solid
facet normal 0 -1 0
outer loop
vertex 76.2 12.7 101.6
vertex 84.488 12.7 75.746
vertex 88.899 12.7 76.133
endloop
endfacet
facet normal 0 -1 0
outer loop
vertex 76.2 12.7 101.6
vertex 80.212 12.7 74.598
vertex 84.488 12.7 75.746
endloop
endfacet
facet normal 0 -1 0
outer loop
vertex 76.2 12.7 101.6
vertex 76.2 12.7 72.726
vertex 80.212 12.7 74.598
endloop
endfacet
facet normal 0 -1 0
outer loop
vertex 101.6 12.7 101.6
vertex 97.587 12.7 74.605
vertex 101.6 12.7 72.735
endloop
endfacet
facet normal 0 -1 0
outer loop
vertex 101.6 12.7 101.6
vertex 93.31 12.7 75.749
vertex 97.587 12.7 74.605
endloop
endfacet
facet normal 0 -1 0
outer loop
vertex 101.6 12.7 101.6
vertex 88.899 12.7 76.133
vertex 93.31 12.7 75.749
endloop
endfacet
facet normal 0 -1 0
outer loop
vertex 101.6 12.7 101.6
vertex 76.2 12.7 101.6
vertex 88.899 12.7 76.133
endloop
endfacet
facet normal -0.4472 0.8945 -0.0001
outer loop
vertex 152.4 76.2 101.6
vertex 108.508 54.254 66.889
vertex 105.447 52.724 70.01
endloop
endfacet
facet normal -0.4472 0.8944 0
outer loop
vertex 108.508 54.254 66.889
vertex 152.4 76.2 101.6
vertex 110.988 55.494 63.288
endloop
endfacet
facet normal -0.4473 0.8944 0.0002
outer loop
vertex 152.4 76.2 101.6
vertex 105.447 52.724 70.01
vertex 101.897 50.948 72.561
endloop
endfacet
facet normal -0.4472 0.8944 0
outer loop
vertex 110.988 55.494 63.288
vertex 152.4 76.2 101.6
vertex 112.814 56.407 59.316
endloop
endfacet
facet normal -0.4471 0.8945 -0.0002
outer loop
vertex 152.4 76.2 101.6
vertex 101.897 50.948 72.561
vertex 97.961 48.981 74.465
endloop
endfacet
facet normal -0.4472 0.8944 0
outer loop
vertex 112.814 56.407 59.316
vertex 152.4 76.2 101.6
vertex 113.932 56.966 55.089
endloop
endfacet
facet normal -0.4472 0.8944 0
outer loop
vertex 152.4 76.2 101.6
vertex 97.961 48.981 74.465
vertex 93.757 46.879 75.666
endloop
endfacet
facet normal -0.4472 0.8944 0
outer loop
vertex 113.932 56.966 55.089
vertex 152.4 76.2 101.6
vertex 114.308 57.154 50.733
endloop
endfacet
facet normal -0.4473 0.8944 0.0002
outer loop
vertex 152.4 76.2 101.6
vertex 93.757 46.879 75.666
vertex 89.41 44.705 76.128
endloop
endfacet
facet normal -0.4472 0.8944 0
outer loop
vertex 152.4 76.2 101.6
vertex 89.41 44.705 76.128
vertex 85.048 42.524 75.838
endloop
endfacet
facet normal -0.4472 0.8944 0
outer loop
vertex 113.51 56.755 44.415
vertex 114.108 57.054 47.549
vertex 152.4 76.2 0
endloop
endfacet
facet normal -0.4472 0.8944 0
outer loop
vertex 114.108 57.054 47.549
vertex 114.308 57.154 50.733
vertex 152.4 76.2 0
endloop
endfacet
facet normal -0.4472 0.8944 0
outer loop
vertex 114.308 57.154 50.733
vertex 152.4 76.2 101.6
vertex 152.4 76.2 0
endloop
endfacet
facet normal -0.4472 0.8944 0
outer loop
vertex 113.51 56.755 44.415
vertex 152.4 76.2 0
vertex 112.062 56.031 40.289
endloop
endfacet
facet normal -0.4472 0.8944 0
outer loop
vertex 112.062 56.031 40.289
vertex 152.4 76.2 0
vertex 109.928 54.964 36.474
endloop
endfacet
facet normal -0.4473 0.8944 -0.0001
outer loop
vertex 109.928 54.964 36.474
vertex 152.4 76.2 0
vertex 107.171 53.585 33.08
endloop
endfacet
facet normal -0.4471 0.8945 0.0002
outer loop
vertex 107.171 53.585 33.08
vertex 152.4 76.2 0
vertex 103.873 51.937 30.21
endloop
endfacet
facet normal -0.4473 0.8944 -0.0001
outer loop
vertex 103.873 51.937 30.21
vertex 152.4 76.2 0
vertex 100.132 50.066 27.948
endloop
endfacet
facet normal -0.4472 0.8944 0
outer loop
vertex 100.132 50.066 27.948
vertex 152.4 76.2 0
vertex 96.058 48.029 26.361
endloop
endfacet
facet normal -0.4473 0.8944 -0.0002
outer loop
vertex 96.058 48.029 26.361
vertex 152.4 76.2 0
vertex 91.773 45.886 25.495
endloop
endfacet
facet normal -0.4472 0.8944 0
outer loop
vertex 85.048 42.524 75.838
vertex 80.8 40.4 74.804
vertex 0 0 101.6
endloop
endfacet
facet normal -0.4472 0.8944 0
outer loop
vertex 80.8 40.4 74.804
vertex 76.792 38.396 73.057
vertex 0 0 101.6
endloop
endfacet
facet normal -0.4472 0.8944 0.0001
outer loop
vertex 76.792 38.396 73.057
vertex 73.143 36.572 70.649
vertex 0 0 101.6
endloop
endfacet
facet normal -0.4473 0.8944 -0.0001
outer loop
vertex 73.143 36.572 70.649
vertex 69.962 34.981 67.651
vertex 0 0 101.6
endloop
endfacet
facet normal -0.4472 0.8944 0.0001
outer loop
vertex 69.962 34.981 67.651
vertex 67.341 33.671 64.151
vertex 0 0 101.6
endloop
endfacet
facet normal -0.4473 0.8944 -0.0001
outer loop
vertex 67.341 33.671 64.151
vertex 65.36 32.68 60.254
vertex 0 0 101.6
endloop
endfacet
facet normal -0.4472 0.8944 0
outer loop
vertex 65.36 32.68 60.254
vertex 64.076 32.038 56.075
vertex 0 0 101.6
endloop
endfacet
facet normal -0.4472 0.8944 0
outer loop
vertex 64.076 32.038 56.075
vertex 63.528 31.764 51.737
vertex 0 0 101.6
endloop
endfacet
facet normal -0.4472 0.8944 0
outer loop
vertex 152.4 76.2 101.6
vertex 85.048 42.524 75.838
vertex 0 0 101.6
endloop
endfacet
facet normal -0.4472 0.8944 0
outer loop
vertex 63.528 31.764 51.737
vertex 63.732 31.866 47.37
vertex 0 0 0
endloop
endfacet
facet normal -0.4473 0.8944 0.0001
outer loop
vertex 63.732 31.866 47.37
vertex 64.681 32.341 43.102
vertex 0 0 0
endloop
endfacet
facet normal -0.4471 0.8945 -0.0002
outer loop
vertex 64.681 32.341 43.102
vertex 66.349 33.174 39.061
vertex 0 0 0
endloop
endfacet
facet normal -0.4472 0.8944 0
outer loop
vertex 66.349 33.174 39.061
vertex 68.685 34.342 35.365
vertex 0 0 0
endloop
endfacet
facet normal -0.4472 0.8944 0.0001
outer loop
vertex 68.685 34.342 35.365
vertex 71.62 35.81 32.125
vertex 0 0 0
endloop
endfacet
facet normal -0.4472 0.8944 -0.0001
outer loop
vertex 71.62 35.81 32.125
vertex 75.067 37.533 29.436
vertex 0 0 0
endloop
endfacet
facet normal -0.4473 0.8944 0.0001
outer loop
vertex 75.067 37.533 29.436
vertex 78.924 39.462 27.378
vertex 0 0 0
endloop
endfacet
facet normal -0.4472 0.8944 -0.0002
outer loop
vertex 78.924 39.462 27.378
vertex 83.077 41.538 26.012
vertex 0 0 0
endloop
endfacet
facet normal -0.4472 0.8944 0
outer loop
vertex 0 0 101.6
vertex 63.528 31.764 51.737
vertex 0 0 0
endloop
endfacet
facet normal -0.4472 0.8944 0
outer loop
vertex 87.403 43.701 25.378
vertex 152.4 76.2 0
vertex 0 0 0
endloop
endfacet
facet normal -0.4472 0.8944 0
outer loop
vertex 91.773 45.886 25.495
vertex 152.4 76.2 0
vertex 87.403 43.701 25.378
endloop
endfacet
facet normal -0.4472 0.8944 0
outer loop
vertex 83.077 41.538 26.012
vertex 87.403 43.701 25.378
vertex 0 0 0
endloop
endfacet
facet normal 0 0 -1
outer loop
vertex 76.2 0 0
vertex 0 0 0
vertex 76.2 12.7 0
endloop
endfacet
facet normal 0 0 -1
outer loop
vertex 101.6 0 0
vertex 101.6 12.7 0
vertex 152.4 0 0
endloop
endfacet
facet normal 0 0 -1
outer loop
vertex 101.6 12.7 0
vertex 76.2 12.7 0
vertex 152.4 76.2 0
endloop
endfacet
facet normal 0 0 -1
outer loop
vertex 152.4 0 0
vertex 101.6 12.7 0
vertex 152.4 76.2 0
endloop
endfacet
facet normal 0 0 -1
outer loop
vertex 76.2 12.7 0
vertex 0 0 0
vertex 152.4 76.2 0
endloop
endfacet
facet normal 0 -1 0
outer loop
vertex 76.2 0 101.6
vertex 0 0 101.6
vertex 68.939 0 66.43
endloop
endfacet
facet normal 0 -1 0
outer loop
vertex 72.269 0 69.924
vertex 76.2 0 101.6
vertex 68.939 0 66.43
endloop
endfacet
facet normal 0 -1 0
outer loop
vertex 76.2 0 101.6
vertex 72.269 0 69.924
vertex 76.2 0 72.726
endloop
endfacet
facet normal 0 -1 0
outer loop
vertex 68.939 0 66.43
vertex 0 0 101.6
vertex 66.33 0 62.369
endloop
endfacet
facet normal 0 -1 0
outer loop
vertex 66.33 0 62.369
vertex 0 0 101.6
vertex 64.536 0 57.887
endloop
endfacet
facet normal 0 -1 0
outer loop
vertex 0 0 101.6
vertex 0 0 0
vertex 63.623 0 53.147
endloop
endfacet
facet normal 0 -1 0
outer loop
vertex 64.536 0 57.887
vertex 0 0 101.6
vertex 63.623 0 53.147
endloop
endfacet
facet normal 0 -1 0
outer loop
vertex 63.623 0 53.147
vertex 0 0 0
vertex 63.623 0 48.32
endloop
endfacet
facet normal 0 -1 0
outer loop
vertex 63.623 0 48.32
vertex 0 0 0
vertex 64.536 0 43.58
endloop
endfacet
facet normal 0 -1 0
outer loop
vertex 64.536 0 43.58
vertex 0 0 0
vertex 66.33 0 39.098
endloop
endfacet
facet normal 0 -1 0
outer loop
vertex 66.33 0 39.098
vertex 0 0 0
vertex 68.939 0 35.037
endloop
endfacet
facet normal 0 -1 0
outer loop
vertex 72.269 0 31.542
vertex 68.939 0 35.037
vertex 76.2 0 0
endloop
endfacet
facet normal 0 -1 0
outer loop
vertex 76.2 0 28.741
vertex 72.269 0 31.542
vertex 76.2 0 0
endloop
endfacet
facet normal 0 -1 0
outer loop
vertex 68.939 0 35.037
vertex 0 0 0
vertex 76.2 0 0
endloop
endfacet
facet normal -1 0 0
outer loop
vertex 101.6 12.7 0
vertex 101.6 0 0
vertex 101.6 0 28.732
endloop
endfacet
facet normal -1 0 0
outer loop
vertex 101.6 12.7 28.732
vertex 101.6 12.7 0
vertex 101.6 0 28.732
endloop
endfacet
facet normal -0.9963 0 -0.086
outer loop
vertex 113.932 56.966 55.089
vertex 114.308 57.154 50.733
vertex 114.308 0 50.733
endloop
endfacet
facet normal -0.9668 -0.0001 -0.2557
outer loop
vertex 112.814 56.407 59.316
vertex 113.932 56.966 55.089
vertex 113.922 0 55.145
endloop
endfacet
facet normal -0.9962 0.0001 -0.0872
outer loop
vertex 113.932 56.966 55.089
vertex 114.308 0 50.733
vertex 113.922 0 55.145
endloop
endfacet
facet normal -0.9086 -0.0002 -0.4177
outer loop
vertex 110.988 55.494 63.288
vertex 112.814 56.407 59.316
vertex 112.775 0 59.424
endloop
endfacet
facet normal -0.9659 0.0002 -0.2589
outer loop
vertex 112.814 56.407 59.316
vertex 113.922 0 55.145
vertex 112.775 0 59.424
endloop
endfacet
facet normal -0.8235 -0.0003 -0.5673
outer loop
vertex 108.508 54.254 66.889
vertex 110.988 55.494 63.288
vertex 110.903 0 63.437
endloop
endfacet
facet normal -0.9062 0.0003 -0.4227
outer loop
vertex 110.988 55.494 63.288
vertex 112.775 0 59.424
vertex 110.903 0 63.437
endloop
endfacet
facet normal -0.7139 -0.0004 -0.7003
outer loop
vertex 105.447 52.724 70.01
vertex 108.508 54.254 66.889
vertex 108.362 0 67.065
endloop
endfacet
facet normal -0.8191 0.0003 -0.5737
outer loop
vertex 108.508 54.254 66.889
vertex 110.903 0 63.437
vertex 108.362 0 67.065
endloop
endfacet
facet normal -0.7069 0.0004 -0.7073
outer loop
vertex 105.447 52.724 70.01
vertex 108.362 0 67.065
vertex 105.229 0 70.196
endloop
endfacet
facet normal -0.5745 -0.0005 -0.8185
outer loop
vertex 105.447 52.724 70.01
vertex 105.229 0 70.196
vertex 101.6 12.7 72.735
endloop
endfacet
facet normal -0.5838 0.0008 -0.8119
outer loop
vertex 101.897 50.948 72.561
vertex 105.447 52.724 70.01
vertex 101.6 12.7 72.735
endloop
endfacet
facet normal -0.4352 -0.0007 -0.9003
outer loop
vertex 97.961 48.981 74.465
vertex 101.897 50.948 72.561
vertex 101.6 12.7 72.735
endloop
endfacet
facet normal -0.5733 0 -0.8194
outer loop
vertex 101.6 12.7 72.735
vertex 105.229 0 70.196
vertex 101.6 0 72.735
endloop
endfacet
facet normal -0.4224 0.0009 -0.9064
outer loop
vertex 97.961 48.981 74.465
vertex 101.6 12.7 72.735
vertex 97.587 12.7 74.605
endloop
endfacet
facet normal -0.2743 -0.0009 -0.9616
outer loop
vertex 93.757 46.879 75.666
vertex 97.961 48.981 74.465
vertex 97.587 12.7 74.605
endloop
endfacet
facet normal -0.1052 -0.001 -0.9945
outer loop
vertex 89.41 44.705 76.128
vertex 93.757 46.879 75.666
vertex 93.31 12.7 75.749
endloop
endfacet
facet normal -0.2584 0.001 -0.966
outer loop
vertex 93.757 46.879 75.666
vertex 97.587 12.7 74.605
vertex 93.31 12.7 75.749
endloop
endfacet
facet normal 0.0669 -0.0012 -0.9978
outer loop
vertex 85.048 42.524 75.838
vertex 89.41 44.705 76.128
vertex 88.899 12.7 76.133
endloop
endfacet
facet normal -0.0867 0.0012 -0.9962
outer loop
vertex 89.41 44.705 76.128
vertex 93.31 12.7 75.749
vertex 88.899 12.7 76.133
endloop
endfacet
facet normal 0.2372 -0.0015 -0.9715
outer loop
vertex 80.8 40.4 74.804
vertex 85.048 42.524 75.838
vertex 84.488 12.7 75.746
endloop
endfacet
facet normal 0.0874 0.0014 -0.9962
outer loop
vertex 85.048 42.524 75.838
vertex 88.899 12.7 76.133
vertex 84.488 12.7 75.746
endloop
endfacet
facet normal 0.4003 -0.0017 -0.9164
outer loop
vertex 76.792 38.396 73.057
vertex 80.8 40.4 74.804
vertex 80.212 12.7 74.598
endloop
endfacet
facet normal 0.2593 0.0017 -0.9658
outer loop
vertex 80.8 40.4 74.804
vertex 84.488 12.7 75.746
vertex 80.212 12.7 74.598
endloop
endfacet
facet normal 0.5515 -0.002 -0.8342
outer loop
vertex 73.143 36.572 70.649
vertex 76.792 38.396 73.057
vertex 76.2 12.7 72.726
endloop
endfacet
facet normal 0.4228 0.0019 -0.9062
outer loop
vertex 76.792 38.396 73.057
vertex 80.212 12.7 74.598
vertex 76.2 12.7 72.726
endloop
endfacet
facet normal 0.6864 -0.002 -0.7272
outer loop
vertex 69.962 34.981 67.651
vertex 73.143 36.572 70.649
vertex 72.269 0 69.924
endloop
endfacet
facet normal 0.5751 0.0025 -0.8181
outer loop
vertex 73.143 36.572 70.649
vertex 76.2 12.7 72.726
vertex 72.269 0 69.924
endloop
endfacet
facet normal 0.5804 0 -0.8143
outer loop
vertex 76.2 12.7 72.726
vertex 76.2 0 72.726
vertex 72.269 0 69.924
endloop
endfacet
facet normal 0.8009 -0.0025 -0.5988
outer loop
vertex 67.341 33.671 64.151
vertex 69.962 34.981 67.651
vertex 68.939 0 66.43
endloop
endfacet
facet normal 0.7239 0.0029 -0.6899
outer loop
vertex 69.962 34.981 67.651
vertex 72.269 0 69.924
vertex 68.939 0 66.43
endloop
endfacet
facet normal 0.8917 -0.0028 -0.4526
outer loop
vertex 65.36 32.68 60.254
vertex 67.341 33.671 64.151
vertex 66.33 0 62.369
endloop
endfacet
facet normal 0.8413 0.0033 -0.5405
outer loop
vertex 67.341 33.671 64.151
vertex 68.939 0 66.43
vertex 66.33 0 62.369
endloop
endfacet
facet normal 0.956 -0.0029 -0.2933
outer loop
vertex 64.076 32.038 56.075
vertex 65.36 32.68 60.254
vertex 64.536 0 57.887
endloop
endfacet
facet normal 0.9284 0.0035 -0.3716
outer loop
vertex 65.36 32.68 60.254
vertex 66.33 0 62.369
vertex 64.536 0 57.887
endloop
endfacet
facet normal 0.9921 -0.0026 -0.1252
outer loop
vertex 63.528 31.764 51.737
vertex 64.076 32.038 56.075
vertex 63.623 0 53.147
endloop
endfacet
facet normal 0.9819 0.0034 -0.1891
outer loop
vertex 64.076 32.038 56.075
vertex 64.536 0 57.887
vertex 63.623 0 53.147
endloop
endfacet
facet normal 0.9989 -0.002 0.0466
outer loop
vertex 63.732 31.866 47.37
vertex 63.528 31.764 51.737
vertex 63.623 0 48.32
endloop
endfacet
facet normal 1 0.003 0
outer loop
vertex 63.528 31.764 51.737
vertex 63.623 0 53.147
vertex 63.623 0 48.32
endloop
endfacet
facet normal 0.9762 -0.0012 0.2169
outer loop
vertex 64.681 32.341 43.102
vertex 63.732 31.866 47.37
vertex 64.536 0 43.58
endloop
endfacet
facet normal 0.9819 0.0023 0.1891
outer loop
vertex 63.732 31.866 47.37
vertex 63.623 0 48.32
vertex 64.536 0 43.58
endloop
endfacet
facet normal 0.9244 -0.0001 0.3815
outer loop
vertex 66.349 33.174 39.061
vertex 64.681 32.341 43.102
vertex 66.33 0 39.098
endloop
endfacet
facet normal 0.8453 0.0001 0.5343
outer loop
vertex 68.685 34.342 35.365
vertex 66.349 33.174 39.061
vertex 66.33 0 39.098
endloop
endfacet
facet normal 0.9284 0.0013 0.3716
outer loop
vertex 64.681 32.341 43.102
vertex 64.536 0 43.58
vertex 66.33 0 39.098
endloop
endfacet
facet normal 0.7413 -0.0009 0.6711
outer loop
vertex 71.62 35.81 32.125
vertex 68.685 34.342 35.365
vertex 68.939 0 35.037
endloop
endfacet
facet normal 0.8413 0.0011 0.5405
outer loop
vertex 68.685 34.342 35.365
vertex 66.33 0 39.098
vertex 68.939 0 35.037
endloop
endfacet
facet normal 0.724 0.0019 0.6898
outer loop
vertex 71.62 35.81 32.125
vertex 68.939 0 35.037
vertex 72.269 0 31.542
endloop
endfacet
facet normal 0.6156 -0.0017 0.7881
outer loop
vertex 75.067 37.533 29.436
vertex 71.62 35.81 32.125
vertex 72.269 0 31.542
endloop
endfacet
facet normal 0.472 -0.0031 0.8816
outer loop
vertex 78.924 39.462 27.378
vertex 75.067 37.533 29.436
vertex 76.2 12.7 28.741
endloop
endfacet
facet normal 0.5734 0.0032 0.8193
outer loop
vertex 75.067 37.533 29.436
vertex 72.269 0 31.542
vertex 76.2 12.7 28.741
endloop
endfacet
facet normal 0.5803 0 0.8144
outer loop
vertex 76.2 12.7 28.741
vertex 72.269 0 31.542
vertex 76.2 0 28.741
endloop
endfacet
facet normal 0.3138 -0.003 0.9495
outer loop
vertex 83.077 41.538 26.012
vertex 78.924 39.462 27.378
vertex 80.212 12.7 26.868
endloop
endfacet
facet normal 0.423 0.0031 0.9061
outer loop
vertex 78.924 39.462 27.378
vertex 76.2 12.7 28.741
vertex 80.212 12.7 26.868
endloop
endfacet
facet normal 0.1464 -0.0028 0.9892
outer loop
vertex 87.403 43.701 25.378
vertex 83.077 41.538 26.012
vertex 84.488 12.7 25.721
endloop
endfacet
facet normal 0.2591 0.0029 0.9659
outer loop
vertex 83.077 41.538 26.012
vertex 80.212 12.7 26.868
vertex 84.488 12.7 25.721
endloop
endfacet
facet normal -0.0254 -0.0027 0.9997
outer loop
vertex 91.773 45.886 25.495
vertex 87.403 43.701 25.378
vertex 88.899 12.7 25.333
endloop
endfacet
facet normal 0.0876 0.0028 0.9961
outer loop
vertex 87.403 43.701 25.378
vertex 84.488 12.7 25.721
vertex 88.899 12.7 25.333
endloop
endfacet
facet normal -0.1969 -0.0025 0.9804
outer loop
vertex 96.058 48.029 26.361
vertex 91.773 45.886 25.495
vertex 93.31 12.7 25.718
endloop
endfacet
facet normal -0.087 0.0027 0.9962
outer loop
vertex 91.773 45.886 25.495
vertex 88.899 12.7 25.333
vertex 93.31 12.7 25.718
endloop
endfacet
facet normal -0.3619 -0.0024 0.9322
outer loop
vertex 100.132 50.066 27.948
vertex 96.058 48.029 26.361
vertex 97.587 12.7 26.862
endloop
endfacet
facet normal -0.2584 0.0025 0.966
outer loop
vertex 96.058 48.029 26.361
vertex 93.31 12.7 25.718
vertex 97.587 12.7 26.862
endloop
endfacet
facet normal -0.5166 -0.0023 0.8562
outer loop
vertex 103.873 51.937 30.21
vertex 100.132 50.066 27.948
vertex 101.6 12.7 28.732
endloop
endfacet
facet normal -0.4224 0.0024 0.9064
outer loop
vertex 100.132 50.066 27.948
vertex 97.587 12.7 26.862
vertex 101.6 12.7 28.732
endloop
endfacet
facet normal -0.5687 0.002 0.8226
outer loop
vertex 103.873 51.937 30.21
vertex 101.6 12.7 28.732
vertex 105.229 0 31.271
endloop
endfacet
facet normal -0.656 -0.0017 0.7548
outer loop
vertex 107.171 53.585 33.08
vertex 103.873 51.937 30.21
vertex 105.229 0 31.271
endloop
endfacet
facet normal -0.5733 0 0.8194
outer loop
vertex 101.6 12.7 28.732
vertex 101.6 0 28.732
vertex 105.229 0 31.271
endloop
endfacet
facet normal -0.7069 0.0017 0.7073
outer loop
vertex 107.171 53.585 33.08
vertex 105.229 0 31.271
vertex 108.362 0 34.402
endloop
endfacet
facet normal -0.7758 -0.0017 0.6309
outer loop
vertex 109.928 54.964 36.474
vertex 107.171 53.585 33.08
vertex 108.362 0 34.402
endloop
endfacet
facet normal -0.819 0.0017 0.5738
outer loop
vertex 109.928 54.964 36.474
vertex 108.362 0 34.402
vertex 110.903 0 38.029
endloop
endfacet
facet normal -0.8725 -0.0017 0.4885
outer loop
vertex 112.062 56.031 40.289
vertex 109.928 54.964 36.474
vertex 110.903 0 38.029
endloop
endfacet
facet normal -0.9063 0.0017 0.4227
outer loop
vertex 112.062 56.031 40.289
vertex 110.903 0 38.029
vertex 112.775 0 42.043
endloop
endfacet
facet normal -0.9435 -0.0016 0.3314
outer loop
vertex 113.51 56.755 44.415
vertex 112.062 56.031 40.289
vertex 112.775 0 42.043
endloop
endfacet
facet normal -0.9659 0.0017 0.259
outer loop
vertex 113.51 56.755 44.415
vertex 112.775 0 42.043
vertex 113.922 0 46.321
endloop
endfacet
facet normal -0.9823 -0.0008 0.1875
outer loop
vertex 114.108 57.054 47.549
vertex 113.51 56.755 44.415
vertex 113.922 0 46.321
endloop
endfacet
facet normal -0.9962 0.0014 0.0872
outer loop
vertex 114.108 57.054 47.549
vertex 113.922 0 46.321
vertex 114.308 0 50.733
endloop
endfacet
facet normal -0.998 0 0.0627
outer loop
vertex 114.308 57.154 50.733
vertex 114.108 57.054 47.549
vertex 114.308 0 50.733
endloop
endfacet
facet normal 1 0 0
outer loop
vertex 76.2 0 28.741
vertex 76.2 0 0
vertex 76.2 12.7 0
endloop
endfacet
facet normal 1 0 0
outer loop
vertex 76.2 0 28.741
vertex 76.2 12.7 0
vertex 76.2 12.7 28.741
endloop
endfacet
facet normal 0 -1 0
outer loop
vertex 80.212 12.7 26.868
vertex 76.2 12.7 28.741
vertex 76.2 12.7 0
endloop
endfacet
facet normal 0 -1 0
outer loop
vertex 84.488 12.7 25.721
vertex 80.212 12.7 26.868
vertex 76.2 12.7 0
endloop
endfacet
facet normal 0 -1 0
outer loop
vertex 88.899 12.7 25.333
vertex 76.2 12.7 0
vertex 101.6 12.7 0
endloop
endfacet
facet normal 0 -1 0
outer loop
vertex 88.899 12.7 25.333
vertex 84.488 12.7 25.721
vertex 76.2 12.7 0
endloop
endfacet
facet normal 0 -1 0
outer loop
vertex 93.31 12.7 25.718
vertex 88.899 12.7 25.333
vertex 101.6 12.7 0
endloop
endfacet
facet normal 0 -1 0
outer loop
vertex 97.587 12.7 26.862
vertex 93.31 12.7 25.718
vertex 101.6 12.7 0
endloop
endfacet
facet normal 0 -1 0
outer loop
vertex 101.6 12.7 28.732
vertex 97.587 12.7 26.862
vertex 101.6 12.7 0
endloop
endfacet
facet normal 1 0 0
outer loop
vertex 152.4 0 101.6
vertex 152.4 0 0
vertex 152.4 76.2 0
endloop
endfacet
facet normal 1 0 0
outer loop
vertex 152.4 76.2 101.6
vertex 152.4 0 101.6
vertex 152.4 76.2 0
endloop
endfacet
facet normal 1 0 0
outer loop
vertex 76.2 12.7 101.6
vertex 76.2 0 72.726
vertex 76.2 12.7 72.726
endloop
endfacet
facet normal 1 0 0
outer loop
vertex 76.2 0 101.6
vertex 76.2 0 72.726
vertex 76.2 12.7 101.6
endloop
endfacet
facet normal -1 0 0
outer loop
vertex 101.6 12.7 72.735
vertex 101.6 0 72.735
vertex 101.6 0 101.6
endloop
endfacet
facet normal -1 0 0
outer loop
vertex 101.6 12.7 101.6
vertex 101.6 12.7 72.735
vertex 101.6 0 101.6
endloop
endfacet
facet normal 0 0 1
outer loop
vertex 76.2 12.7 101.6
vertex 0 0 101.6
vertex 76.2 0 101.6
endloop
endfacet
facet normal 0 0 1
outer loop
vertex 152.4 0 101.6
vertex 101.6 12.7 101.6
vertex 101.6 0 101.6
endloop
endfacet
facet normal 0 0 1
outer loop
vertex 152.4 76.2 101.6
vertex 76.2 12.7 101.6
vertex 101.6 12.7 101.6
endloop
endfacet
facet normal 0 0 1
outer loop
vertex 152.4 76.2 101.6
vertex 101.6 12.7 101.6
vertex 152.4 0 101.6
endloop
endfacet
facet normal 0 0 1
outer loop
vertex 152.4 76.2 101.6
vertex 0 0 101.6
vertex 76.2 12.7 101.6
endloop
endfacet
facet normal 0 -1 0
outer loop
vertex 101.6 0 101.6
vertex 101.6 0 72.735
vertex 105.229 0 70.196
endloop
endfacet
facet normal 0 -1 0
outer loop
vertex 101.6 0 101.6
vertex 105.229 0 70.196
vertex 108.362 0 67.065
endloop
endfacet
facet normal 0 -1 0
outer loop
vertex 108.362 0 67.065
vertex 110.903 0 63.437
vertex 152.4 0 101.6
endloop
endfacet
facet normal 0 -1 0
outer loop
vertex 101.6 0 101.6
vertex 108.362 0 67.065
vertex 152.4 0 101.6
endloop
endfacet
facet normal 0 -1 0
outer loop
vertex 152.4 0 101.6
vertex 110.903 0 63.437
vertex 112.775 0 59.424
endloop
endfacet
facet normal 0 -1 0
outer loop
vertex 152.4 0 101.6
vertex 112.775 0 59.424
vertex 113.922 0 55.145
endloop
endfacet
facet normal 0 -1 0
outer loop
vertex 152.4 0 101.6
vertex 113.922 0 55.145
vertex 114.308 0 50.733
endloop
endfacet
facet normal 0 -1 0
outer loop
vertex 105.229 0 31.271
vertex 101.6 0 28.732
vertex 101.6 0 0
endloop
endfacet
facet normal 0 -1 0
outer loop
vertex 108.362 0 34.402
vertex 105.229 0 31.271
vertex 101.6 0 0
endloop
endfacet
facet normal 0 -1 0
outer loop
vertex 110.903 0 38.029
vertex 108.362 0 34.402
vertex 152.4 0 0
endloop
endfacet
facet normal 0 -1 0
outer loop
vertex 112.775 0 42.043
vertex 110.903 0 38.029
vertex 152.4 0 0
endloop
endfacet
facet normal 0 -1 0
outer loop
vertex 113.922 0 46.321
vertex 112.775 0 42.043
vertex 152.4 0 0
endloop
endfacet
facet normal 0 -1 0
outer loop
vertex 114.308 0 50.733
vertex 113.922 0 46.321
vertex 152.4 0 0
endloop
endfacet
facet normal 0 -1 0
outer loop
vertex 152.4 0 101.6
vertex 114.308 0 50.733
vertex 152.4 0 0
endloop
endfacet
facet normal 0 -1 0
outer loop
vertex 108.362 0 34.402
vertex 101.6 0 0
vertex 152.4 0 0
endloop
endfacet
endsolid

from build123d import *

# Parameters (mm, degrees)
F1_DEPTH = 101.6
F3_W     = 25.4
F3_H     = 101.6
F4_DEPTH = 12.7
F5_R     = 25.4
F6_DEPTH = 76.201


with BuildPart() as f1:
    # F0 (on Top) → F1 (new body)
    with BuildSketch(Plane.XY):
        Polygon((152.4, 76.2), (0, 0), (152.4, 0), align=None)
    extrude(amount=F1_DEPTH)

    # F3 (on face) → F4 (cut)
    with BuildSketch(Plane.XZ):
        with Locations((88.9, 50.8)):
            Rectangle(F3_W, F3_H)
    extrude(amount=-F4_DEPTH, mode=Mode.SUBTRACT)

    # F5 (on face) → F6 (cut, through all)
    with BuildSketch(Plane.XZ):
        with Locations((88.907994, 50.733309)):
            Circle(F5_R)
    extrude(amount=-F6_DEPTH, mode=Mode.SUBTRACT)


solid = f1.part
